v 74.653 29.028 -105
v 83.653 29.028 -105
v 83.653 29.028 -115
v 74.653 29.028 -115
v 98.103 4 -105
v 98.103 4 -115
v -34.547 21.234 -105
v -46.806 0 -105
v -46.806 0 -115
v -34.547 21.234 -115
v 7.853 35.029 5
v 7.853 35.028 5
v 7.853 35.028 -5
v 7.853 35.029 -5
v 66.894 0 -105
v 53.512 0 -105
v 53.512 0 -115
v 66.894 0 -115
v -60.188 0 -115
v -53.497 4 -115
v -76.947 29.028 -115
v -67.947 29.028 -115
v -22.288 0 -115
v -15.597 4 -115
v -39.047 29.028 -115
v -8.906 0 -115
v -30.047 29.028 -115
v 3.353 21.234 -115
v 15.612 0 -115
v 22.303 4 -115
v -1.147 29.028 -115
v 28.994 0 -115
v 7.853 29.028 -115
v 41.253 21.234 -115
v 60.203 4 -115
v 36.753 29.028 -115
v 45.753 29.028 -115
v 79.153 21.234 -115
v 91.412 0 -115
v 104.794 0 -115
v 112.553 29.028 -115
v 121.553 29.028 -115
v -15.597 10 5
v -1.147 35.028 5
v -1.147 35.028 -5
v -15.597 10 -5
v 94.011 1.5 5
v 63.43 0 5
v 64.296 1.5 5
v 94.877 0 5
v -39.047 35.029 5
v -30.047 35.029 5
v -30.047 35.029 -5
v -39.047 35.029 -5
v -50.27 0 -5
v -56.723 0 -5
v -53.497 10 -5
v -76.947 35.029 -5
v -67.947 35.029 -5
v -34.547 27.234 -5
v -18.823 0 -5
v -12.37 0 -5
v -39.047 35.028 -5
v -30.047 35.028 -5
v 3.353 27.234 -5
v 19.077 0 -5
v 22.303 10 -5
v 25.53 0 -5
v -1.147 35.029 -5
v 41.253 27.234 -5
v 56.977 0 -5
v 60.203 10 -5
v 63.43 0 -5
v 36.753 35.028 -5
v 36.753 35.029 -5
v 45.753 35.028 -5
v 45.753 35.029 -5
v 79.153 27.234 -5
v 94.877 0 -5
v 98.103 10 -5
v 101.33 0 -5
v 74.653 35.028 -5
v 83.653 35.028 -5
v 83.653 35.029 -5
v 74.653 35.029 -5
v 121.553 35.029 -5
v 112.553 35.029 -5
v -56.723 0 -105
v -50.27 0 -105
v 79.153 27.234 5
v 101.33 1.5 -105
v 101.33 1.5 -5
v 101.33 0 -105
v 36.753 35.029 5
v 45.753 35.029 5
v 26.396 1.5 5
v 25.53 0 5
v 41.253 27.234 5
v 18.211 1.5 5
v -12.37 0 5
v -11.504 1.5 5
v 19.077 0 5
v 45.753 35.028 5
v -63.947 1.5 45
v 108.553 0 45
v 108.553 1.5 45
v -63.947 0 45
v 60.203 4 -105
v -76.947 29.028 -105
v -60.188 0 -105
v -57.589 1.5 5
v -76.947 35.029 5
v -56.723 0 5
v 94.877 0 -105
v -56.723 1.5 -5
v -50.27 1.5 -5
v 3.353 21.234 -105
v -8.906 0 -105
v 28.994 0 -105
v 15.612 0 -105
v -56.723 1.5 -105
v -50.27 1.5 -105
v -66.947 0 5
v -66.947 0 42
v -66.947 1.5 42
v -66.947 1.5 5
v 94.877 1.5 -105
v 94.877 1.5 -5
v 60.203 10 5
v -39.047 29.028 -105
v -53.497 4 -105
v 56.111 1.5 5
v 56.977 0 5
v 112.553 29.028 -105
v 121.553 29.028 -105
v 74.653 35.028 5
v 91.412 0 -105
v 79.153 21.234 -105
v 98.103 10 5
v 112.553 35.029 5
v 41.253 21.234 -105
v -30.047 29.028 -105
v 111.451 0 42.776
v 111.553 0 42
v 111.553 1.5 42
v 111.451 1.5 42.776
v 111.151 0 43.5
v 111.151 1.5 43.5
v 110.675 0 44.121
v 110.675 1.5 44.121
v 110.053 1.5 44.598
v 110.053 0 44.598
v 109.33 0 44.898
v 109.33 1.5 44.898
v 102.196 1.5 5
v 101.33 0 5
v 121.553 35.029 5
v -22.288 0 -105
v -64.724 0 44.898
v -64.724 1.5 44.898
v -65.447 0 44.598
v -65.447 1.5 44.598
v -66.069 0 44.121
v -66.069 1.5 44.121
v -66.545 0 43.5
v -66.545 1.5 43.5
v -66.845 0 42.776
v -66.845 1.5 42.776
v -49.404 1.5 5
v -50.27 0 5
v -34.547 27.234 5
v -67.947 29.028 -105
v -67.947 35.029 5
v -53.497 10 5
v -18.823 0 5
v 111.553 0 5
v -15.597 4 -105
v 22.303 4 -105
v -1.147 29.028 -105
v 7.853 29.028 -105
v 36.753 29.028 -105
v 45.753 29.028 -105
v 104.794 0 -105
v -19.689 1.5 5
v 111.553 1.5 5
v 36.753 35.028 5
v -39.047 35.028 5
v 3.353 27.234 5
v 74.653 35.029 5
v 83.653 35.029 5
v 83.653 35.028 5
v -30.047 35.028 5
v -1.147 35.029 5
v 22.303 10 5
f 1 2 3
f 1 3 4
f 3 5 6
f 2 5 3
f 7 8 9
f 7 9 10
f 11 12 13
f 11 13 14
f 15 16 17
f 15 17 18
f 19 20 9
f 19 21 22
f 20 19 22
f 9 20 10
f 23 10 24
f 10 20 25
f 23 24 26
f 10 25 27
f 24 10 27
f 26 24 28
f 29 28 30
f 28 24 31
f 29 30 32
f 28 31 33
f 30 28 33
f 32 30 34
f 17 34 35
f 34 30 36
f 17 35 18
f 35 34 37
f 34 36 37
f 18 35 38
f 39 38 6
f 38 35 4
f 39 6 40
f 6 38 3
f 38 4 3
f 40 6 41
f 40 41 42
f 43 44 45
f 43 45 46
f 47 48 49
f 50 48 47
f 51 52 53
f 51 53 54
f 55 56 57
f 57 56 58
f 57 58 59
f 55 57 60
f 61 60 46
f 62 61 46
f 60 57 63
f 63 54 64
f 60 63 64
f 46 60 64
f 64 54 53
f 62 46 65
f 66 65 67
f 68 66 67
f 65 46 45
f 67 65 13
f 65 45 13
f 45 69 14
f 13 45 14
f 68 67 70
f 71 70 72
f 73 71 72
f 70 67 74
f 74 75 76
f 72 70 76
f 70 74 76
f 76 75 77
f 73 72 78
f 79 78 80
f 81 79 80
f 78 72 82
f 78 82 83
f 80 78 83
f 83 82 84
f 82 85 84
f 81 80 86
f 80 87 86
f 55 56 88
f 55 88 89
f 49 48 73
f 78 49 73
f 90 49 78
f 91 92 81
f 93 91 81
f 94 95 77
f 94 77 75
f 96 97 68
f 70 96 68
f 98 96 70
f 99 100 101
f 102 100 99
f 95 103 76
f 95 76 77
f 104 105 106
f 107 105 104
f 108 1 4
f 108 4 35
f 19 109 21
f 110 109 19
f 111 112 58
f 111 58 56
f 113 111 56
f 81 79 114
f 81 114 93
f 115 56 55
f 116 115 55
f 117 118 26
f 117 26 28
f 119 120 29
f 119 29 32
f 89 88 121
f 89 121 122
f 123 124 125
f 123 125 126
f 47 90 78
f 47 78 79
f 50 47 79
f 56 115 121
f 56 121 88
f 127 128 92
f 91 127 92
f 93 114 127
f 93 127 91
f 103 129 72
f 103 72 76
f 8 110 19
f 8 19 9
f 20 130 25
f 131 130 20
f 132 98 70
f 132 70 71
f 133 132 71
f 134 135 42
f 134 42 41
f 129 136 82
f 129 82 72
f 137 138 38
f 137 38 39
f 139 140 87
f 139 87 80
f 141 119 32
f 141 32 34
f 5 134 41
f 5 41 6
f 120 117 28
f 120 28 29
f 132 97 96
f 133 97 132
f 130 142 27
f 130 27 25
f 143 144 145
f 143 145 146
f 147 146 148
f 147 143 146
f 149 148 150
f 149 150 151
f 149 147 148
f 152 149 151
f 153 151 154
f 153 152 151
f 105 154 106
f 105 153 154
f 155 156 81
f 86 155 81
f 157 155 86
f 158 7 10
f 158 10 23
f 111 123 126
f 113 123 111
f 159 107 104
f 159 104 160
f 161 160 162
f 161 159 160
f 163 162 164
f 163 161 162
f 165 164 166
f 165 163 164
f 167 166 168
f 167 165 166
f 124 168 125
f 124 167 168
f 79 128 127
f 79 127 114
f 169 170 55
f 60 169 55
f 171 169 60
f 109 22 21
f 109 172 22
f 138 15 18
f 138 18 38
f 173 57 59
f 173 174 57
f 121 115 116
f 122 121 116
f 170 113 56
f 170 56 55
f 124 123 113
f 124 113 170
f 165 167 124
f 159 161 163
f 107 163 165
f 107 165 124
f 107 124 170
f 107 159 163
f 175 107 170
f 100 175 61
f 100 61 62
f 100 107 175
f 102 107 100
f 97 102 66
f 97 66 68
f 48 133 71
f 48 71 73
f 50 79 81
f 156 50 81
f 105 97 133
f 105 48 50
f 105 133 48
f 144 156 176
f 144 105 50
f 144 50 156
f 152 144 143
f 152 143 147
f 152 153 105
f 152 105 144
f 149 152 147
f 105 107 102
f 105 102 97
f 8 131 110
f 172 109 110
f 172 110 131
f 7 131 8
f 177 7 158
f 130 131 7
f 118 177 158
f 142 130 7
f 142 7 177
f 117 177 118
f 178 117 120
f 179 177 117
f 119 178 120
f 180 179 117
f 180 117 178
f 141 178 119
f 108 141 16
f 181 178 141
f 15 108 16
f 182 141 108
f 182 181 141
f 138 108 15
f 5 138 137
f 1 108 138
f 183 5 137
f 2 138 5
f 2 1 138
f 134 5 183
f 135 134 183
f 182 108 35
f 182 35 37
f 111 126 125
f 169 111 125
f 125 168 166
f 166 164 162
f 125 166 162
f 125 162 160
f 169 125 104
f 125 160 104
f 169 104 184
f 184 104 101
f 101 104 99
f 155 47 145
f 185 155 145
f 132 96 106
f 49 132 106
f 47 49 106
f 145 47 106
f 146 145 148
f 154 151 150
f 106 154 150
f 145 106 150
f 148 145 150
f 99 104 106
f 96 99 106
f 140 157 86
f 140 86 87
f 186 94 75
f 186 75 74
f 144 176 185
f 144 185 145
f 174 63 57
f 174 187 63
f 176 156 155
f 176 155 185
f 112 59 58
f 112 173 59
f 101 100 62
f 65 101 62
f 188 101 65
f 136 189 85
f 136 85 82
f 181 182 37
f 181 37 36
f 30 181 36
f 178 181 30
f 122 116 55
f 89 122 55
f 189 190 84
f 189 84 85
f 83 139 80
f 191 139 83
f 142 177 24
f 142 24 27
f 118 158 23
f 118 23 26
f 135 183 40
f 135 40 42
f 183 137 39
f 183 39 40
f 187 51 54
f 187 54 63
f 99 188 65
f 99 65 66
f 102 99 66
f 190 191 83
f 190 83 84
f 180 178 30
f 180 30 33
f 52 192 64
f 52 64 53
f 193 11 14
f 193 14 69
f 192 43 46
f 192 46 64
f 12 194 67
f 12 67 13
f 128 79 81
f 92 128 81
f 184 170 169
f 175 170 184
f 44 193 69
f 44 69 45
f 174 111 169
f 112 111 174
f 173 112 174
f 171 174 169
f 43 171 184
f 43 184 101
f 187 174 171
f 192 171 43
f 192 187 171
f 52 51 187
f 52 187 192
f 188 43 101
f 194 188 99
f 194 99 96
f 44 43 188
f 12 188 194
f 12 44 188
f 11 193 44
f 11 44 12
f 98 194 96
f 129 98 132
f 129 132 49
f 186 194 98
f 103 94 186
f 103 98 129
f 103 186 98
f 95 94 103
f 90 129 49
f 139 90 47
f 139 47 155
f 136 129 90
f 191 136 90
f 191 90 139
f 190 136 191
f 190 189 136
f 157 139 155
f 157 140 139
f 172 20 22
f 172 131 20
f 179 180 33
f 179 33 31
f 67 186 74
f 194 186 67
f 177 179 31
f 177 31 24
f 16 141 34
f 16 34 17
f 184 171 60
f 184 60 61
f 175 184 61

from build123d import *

# Parameters (mm, degrees)
F1_DEPTH = 5
F4_DEPTH = 5
F6_DEPTH = 1.5
F7_W     = 6.452995
F7_H     = 1.5
F8_DEPTH = 100


with BuildPart() as f1:
    # F0 (on Top) → F1 (new body, symmetric)
    with BuildSketch(Plane.XY):
        Polygon((-67.947316, 35.028733), (-76.947316, 35.028733), (-56.723467, 0), (-50.270472, 0), (-34.54697, 27.233906), (-39.04697, 35.028134), (-53.49697, 10), align=None)
        Polygon((-39.04697, 35.028134), (-34.54697, 27.233906), (-30.04697, 35.028134), (-30.047316, 35.028733), (-39.046624, 35.028733), align=None)
        Polygon((-30.04697, 35.028134), (-34.54697, 27.233906), (-18.823467, 0), (-12.370472, 0), (3.35303, 27.233906), (-1.14697, 35.028134), (-15.59697, 10), align=None)
        Polygon((-39.047316, 35.028733), (-39.04697, 35.028134), (-39.046624, 35.028733), align=None)
        Polygon((-30.047316, 35.028733), (-30.04697, 35.028134), (-30.046624, 35.028733), align=None)
        Polygon((-1.147316, 35.028733), (-1.14697, 35.028134), (-1.146624, 35.028733), align=None)
        Polygon((-1.146624, 35.028733), (-1.14697, 35.028134), (3.35303, 27.233906), (7.85303, 35.028134), (7.852684, 35.028733), align=None)
        Polygon((7.85303, 35.028134), (3.35303, 27.233906), (19.076533, 0), (25.529528, 0), (41.25303, 27.233906), (36.75303, 35.028134), (22.30303, 10), align=None)
        Polygon((7.852684, 35.028733), (7.85303, 35.028134), (7.853376, 35.028733), align=None)
        Polygon((36.752684, 35.028733), (36.75303, 35.028134), (36.753376, 35.028733), align=None)
        Polygon((36.753376, 35.028733), (36.75303, 35.028134), (41.25303, 27.233906), (45.75303, 35.028134), (45.752684, 35.028733), align=None)
        Polygon((45.75303, 35.028134), (41.25303, 27.233906), (56.976533, 0), (63.429528, 0), (79.15303, 27.233906), (74.65303, 35.028134), (60.20303, 10), align=None)
        Polygon((45.752684, 35.028733), (45.75303, 35.028134), (45.753376, 35.028733), align=None)
        Polygon((74.652684, 35.028733), (74.65303, 35.028134), (74.653376, 35.028733), align=None)
        Polygon((74.653376, 35.028733), (74.65303, 35.028134), (79.15303, 27.233906), (83.65303, 35.028134), (83.652684, 35.028733), align=None)
        Polygon((83.65303, 35.028134), (79.15303, 27.233906), (94.876533, 0), (101.329528, 0), (121.553376, 35.028733), (112.553376, 35.028733), (98.10303, 10), align=None)
        Polygon((83.652684, 35.028733), (83.65303, 35.028134), (83.653376, 35.028733), align=None)
    extrude(amount=F1_DEPTH, both=True)

    # F5 (on Front) → F6 (join)
    with BuildSketch(Plane.XZ):
        with BuildLine():
            Line((108.553376, 45), (-63.947316, 45))
            ThreePointArc((-63.947316, 45), (-66.068636, 44.12132), (-66.947316, 42))
            Line((-66.947316, 42), (-66.947316, 5))
            Line((-66.947316, 5), (111.553376, 5))
            Line((111.553376, 5), (111.553376, 42))
            ThreePointArc((111.553376, 42), (110.674697, 44.12132), (108.553376, 45))
        make_face()
    extrude(amount=-F6_DEPTH)


with BuildPart() as f4:
    # F3 (on offset) → F4 (new body, symmetric)
    with BuildSketch(Plane.XY.offset(-110)):
        Polygon((-67.94697, 29.028134), (-76.94697, 29.028134), (-60.187569, 0), (-46.806371, 0), (-34.54697, 21.233906), (-39.04697, 29.028134), (-53.49697, 4), align=None)
        Polygon((-39.04697, 29.028134), (-34.54697, 21.233906), (-30.04697, 29.028134), align=None)
        Polygon((-30.04697, 29.028134), (-34.54697, 21.233906), (-22.287569, 0), (-8.906371, 0), (3.35303, 21.233906), (-1.14697, 29.028134), (-15.59697, 4), align=None)
        Polygon((7.85303, 29.028134), (-1.14697, 29.028134), (3.35303, 21.233906), align=None)
        Polygon((7.85303, 29.028134), (3.35303, 21.233906), (15.612431, 0), (28.993629, 0), (41.25303, 21.233906), (36.75303, 29.028134), (22.30303, 4), align=None)
        Polygon((45.75303, 29.028134), (36.75303, 29.028134), (41.25303, 21.233906), align=None)
        Polygon((45.75303, 29.028134), (41.25303, 21.233906), (53.512431, 0), (66.893629, 0), (79.15303, 21.233906), (74.65303, 29.028134), (60.20303, 4), align=None)
        Polygon((83.65303, 29.028134), (74.65303, 29.028134), (79.15303, 21.233906), align=None)
        Polygon((83.65303, 29.028134), (79.15303, 21.233906), (91.412431, 0), (104.793629, 0), (121.55303, 29.028134), (112.55303, 29.028134), (98.10303, 4), align=None)
    extrude(amount=F4_DEPTH, both=True)


with BuildPart() as f8:
    # F7 (on face) → F8 (new body, through all)
    with BuildSketch(Plane(origin=(0, 0, -5), x_dir=(1, 0, 0), z_dir=(0, 0, -1))):
        with Locations((98.10303, -0.75)):
            Rectangle(F7_W, F7_H)
        with Locations((-53.496969, -0.75)):
            Rectangle(F7_W, F7_H)
    extrude(amount=F8_DEPTH)


solid = Compound([f1.part, f4.part, f8.part])
